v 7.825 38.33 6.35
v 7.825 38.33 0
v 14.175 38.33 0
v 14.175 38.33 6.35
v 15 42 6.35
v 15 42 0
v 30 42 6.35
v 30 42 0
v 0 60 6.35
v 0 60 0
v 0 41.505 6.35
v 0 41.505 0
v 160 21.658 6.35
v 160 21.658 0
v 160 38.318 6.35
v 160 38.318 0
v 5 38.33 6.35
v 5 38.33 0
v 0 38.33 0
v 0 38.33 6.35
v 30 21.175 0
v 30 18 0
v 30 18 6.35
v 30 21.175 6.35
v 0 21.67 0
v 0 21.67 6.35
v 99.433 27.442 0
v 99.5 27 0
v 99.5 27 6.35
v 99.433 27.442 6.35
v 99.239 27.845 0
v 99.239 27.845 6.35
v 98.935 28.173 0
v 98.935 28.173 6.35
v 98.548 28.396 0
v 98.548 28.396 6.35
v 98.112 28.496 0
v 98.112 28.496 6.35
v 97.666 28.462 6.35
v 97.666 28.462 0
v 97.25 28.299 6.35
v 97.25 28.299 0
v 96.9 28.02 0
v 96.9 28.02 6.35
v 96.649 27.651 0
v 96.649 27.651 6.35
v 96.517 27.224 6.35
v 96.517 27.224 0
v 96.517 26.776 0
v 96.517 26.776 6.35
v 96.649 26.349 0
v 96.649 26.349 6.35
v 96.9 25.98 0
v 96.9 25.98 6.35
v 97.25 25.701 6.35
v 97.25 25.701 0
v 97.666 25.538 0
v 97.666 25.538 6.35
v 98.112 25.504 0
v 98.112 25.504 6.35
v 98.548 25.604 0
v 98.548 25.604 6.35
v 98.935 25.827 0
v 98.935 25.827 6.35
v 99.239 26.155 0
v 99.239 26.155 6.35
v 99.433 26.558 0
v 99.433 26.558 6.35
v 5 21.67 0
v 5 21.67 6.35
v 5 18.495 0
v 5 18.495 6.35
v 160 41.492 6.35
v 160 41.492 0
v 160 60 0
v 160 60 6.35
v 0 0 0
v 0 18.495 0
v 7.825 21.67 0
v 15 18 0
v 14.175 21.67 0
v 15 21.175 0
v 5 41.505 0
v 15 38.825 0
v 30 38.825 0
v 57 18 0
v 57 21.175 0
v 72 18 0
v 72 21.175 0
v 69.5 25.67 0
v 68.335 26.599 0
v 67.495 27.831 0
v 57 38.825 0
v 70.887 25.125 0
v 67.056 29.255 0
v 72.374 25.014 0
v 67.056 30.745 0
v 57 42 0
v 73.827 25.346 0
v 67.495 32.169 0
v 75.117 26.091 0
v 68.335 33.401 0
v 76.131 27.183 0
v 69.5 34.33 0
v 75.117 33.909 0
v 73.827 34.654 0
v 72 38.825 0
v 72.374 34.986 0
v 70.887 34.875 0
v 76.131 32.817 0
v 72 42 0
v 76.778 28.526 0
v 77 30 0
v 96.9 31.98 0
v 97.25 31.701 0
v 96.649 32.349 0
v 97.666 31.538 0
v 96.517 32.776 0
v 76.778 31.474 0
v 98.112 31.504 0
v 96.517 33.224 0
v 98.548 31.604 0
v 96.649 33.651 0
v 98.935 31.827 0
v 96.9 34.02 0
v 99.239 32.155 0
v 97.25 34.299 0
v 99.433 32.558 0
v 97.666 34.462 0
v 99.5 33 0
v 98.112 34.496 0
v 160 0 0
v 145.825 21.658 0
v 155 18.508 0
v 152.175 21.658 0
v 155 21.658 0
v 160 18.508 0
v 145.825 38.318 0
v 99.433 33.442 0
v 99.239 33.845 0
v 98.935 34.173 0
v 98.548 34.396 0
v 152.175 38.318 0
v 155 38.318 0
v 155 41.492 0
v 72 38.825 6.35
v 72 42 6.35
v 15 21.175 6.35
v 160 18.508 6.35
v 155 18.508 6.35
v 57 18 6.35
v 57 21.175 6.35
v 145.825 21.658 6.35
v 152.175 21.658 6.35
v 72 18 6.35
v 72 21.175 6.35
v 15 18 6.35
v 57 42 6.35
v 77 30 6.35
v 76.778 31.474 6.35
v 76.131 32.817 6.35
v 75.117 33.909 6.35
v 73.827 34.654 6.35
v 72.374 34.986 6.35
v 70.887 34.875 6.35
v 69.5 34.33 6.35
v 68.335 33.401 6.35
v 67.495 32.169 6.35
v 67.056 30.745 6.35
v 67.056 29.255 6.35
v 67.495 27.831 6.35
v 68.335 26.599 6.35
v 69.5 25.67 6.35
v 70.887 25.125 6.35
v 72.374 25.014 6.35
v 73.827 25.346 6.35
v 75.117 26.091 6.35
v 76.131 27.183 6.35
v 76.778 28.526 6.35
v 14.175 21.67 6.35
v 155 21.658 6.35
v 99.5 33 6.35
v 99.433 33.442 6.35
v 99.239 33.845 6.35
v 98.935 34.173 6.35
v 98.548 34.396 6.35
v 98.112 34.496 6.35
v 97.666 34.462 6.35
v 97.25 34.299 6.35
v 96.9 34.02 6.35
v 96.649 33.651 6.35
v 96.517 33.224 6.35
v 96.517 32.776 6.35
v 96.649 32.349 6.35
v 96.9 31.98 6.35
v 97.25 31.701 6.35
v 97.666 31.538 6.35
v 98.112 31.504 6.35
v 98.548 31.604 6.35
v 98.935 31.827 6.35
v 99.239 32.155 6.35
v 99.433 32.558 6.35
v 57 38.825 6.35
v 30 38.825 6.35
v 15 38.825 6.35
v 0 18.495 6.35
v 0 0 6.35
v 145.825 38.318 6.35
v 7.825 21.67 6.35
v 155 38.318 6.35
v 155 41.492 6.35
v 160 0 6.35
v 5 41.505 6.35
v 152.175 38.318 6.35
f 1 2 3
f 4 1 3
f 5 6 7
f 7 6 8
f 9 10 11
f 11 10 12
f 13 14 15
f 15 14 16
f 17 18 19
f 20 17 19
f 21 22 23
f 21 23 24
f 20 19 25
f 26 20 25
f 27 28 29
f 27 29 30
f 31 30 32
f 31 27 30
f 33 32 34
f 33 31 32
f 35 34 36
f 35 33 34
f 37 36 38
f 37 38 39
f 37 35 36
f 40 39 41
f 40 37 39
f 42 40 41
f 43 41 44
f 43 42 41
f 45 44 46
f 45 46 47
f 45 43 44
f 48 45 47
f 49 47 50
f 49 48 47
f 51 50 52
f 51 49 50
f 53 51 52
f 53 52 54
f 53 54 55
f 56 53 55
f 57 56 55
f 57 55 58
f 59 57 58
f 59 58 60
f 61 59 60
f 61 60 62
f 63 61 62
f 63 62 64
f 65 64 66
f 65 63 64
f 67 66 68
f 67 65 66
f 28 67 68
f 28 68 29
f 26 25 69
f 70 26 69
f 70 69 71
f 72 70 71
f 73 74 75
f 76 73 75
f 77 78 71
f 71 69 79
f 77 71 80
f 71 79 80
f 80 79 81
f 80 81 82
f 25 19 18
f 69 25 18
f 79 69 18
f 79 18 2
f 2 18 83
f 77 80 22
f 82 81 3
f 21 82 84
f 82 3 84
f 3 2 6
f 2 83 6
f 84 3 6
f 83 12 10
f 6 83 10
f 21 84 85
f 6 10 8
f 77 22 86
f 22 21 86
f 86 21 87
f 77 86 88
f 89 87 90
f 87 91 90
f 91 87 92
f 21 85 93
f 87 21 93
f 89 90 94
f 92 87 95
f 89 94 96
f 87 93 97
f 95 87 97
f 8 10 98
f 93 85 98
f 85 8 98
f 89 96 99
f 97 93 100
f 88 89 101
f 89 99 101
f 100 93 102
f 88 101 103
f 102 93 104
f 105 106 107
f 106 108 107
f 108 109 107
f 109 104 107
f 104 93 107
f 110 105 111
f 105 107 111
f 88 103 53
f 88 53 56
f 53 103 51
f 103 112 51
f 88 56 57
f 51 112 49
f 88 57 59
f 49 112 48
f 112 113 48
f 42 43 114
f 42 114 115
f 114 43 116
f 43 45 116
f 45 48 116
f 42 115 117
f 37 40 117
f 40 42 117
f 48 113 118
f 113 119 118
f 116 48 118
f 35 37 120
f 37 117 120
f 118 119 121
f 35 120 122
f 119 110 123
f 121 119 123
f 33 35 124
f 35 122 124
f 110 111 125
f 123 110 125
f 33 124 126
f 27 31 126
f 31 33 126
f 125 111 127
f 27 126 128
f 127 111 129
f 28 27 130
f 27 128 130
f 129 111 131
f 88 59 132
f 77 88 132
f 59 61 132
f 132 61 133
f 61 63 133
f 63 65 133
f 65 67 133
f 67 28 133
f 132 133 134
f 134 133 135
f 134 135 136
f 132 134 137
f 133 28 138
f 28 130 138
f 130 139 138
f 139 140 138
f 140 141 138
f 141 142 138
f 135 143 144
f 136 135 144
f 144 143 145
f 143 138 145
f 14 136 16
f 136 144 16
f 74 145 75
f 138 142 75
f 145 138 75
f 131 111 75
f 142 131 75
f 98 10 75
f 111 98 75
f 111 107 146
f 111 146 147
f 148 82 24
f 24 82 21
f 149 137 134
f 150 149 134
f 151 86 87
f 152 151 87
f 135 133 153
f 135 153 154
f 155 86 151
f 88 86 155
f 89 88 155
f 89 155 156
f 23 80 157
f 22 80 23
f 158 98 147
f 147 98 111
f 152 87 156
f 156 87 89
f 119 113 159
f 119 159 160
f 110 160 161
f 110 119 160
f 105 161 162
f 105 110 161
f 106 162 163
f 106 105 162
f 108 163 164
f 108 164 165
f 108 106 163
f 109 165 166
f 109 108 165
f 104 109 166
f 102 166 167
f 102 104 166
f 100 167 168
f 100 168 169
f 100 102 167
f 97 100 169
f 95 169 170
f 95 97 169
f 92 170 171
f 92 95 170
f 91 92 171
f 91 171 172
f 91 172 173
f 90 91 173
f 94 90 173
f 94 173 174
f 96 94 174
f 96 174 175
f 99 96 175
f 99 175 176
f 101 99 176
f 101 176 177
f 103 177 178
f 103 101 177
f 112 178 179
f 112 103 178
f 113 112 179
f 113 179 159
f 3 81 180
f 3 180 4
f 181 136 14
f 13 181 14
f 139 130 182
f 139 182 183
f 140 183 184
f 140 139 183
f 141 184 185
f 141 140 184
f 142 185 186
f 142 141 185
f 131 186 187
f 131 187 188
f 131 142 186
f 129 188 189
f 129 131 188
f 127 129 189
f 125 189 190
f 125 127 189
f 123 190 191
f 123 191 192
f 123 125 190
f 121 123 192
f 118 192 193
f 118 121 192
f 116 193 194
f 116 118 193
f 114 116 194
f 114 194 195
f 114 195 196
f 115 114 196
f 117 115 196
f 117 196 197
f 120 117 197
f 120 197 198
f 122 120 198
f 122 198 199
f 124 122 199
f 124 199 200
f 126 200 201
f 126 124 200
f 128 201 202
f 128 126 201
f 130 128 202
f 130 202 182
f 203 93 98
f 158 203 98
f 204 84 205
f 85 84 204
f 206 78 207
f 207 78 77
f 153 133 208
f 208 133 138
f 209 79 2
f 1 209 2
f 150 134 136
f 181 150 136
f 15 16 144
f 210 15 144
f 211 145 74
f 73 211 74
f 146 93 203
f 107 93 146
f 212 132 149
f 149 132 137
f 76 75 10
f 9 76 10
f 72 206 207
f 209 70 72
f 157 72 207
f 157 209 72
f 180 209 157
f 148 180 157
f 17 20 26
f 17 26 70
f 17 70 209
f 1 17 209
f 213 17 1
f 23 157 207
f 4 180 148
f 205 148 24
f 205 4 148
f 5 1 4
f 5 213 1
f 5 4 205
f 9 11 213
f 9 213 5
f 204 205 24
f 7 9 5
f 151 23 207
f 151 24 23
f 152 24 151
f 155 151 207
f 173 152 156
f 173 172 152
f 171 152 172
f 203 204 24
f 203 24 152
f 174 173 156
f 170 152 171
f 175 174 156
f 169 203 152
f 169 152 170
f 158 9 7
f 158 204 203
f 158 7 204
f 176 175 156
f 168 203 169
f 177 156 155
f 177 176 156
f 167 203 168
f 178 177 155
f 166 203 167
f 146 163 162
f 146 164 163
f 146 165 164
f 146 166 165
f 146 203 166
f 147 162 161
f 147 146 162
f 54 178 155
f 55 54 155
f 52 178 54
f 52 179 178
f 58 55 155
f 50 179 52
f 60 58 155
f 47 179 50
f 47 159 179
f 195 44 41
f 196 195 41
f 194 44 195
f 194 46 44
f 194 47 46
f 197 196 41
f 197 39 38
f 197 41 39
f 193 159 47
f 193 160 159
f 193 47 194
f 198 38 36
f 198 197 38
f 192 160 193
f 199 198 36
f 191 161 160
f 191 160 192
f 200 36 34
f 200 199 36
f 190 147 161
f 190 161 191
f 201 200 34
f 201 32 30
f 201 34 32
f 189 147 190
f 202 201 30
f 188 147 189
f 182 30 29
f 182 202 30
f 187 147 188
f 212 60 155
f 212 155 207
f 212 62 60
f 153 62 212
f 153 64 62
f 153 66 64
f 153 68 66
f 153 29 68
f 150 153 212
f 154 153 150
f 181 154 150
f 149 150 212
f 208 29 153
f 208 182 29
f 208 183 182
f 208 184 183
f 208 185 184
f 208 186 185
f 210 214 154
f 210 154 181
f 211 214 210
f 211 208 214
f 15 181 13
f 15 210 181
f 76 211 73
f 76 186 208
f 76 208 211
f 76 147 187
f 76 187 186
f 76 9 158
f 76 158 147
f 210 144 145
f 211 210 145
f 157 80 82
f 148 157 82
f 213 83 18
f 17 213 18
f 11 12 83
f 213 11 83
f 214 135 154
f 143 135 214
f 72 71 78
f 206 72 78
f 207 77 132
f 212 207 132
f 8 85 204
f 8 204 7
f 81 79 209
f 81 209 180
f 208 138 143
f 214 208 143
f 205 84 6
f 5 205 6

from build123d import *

# Parameters (mm, degrees)
SKETCH1_R           = 5
SKETCH1_R_2         = 1.5
SKETCH1_W           = 15
SKETCH1_H           = 3.175
SKETCH1_W_2         = 6.35
SKETCH1_H_2         = 16.66
BOSS_EXTRUDE1_DEPTH = 6.35


with BuildPart() as part:
    # Sketch1 → Boss-Extrude1 (new body)
    with BuildSketch(Plane.XY):
        Polygon((160, 0), (160, 18.5075), (155, 18.5075), (155, 21.6575), (160, 21.6575), (160, 38.3175), (155, 38.3175), (155, 41.4925), (160, 41.4925), (160, 60), (0, 60), (0, 41.505), (5, 41.505), (5, 38.33), (0, 38.33), (0, 21.67), (5, 21.67), (5, 18.495), (0, 18.495), (0, 0), align=None)
        with Locations((72, 30)):
            Circle(SKETCH1_R, mode=Mode.SUBTRACT)
        with Locations((98, 27)):
            Circle(SKETCH1_R_2, mode=Mode.SUBTRACT)
        with Locations((98, 33)):
            Circle(SKETCH1_R_2, mode=Mode.SUBTRACT)
        with Locations((64.5, 19.5875)):
            Rectangle(SKETCH1_W, SKETCH1_H, mode=Mode.SUBTRACT)
        with Locations((64.5, 40.4125)):
            Rectangle(SKETCH1_W, SKETCH1_H, mode=Mode.SUBTRACT)
        with Locations((22.5, 40.4125)):
            Rectangle(SKETCH1_W, SKETCH1_H, mode=Mode.SUBTRACT)
        with Locations((11.000000297, 30)):
            Rectangle(SKETCH1_W_2, SKETCH1_H_2, mode=Mode.SUBTRACT)
        with Locations((148.999999703, 29.9875)):
            Rectangle(SKETCH1_W_2, SKETCH1_H_2, mode=Mode.SUBTRACT)
        with Locations((22.5, 19.5875)):
            Rectangle(SKETCH1_W, SKETCH1_H, mode=Mode.SUBTRACT)
    extrude(amount=BOSS_EXTRUDE1_DEPTH)


solid = part.part
